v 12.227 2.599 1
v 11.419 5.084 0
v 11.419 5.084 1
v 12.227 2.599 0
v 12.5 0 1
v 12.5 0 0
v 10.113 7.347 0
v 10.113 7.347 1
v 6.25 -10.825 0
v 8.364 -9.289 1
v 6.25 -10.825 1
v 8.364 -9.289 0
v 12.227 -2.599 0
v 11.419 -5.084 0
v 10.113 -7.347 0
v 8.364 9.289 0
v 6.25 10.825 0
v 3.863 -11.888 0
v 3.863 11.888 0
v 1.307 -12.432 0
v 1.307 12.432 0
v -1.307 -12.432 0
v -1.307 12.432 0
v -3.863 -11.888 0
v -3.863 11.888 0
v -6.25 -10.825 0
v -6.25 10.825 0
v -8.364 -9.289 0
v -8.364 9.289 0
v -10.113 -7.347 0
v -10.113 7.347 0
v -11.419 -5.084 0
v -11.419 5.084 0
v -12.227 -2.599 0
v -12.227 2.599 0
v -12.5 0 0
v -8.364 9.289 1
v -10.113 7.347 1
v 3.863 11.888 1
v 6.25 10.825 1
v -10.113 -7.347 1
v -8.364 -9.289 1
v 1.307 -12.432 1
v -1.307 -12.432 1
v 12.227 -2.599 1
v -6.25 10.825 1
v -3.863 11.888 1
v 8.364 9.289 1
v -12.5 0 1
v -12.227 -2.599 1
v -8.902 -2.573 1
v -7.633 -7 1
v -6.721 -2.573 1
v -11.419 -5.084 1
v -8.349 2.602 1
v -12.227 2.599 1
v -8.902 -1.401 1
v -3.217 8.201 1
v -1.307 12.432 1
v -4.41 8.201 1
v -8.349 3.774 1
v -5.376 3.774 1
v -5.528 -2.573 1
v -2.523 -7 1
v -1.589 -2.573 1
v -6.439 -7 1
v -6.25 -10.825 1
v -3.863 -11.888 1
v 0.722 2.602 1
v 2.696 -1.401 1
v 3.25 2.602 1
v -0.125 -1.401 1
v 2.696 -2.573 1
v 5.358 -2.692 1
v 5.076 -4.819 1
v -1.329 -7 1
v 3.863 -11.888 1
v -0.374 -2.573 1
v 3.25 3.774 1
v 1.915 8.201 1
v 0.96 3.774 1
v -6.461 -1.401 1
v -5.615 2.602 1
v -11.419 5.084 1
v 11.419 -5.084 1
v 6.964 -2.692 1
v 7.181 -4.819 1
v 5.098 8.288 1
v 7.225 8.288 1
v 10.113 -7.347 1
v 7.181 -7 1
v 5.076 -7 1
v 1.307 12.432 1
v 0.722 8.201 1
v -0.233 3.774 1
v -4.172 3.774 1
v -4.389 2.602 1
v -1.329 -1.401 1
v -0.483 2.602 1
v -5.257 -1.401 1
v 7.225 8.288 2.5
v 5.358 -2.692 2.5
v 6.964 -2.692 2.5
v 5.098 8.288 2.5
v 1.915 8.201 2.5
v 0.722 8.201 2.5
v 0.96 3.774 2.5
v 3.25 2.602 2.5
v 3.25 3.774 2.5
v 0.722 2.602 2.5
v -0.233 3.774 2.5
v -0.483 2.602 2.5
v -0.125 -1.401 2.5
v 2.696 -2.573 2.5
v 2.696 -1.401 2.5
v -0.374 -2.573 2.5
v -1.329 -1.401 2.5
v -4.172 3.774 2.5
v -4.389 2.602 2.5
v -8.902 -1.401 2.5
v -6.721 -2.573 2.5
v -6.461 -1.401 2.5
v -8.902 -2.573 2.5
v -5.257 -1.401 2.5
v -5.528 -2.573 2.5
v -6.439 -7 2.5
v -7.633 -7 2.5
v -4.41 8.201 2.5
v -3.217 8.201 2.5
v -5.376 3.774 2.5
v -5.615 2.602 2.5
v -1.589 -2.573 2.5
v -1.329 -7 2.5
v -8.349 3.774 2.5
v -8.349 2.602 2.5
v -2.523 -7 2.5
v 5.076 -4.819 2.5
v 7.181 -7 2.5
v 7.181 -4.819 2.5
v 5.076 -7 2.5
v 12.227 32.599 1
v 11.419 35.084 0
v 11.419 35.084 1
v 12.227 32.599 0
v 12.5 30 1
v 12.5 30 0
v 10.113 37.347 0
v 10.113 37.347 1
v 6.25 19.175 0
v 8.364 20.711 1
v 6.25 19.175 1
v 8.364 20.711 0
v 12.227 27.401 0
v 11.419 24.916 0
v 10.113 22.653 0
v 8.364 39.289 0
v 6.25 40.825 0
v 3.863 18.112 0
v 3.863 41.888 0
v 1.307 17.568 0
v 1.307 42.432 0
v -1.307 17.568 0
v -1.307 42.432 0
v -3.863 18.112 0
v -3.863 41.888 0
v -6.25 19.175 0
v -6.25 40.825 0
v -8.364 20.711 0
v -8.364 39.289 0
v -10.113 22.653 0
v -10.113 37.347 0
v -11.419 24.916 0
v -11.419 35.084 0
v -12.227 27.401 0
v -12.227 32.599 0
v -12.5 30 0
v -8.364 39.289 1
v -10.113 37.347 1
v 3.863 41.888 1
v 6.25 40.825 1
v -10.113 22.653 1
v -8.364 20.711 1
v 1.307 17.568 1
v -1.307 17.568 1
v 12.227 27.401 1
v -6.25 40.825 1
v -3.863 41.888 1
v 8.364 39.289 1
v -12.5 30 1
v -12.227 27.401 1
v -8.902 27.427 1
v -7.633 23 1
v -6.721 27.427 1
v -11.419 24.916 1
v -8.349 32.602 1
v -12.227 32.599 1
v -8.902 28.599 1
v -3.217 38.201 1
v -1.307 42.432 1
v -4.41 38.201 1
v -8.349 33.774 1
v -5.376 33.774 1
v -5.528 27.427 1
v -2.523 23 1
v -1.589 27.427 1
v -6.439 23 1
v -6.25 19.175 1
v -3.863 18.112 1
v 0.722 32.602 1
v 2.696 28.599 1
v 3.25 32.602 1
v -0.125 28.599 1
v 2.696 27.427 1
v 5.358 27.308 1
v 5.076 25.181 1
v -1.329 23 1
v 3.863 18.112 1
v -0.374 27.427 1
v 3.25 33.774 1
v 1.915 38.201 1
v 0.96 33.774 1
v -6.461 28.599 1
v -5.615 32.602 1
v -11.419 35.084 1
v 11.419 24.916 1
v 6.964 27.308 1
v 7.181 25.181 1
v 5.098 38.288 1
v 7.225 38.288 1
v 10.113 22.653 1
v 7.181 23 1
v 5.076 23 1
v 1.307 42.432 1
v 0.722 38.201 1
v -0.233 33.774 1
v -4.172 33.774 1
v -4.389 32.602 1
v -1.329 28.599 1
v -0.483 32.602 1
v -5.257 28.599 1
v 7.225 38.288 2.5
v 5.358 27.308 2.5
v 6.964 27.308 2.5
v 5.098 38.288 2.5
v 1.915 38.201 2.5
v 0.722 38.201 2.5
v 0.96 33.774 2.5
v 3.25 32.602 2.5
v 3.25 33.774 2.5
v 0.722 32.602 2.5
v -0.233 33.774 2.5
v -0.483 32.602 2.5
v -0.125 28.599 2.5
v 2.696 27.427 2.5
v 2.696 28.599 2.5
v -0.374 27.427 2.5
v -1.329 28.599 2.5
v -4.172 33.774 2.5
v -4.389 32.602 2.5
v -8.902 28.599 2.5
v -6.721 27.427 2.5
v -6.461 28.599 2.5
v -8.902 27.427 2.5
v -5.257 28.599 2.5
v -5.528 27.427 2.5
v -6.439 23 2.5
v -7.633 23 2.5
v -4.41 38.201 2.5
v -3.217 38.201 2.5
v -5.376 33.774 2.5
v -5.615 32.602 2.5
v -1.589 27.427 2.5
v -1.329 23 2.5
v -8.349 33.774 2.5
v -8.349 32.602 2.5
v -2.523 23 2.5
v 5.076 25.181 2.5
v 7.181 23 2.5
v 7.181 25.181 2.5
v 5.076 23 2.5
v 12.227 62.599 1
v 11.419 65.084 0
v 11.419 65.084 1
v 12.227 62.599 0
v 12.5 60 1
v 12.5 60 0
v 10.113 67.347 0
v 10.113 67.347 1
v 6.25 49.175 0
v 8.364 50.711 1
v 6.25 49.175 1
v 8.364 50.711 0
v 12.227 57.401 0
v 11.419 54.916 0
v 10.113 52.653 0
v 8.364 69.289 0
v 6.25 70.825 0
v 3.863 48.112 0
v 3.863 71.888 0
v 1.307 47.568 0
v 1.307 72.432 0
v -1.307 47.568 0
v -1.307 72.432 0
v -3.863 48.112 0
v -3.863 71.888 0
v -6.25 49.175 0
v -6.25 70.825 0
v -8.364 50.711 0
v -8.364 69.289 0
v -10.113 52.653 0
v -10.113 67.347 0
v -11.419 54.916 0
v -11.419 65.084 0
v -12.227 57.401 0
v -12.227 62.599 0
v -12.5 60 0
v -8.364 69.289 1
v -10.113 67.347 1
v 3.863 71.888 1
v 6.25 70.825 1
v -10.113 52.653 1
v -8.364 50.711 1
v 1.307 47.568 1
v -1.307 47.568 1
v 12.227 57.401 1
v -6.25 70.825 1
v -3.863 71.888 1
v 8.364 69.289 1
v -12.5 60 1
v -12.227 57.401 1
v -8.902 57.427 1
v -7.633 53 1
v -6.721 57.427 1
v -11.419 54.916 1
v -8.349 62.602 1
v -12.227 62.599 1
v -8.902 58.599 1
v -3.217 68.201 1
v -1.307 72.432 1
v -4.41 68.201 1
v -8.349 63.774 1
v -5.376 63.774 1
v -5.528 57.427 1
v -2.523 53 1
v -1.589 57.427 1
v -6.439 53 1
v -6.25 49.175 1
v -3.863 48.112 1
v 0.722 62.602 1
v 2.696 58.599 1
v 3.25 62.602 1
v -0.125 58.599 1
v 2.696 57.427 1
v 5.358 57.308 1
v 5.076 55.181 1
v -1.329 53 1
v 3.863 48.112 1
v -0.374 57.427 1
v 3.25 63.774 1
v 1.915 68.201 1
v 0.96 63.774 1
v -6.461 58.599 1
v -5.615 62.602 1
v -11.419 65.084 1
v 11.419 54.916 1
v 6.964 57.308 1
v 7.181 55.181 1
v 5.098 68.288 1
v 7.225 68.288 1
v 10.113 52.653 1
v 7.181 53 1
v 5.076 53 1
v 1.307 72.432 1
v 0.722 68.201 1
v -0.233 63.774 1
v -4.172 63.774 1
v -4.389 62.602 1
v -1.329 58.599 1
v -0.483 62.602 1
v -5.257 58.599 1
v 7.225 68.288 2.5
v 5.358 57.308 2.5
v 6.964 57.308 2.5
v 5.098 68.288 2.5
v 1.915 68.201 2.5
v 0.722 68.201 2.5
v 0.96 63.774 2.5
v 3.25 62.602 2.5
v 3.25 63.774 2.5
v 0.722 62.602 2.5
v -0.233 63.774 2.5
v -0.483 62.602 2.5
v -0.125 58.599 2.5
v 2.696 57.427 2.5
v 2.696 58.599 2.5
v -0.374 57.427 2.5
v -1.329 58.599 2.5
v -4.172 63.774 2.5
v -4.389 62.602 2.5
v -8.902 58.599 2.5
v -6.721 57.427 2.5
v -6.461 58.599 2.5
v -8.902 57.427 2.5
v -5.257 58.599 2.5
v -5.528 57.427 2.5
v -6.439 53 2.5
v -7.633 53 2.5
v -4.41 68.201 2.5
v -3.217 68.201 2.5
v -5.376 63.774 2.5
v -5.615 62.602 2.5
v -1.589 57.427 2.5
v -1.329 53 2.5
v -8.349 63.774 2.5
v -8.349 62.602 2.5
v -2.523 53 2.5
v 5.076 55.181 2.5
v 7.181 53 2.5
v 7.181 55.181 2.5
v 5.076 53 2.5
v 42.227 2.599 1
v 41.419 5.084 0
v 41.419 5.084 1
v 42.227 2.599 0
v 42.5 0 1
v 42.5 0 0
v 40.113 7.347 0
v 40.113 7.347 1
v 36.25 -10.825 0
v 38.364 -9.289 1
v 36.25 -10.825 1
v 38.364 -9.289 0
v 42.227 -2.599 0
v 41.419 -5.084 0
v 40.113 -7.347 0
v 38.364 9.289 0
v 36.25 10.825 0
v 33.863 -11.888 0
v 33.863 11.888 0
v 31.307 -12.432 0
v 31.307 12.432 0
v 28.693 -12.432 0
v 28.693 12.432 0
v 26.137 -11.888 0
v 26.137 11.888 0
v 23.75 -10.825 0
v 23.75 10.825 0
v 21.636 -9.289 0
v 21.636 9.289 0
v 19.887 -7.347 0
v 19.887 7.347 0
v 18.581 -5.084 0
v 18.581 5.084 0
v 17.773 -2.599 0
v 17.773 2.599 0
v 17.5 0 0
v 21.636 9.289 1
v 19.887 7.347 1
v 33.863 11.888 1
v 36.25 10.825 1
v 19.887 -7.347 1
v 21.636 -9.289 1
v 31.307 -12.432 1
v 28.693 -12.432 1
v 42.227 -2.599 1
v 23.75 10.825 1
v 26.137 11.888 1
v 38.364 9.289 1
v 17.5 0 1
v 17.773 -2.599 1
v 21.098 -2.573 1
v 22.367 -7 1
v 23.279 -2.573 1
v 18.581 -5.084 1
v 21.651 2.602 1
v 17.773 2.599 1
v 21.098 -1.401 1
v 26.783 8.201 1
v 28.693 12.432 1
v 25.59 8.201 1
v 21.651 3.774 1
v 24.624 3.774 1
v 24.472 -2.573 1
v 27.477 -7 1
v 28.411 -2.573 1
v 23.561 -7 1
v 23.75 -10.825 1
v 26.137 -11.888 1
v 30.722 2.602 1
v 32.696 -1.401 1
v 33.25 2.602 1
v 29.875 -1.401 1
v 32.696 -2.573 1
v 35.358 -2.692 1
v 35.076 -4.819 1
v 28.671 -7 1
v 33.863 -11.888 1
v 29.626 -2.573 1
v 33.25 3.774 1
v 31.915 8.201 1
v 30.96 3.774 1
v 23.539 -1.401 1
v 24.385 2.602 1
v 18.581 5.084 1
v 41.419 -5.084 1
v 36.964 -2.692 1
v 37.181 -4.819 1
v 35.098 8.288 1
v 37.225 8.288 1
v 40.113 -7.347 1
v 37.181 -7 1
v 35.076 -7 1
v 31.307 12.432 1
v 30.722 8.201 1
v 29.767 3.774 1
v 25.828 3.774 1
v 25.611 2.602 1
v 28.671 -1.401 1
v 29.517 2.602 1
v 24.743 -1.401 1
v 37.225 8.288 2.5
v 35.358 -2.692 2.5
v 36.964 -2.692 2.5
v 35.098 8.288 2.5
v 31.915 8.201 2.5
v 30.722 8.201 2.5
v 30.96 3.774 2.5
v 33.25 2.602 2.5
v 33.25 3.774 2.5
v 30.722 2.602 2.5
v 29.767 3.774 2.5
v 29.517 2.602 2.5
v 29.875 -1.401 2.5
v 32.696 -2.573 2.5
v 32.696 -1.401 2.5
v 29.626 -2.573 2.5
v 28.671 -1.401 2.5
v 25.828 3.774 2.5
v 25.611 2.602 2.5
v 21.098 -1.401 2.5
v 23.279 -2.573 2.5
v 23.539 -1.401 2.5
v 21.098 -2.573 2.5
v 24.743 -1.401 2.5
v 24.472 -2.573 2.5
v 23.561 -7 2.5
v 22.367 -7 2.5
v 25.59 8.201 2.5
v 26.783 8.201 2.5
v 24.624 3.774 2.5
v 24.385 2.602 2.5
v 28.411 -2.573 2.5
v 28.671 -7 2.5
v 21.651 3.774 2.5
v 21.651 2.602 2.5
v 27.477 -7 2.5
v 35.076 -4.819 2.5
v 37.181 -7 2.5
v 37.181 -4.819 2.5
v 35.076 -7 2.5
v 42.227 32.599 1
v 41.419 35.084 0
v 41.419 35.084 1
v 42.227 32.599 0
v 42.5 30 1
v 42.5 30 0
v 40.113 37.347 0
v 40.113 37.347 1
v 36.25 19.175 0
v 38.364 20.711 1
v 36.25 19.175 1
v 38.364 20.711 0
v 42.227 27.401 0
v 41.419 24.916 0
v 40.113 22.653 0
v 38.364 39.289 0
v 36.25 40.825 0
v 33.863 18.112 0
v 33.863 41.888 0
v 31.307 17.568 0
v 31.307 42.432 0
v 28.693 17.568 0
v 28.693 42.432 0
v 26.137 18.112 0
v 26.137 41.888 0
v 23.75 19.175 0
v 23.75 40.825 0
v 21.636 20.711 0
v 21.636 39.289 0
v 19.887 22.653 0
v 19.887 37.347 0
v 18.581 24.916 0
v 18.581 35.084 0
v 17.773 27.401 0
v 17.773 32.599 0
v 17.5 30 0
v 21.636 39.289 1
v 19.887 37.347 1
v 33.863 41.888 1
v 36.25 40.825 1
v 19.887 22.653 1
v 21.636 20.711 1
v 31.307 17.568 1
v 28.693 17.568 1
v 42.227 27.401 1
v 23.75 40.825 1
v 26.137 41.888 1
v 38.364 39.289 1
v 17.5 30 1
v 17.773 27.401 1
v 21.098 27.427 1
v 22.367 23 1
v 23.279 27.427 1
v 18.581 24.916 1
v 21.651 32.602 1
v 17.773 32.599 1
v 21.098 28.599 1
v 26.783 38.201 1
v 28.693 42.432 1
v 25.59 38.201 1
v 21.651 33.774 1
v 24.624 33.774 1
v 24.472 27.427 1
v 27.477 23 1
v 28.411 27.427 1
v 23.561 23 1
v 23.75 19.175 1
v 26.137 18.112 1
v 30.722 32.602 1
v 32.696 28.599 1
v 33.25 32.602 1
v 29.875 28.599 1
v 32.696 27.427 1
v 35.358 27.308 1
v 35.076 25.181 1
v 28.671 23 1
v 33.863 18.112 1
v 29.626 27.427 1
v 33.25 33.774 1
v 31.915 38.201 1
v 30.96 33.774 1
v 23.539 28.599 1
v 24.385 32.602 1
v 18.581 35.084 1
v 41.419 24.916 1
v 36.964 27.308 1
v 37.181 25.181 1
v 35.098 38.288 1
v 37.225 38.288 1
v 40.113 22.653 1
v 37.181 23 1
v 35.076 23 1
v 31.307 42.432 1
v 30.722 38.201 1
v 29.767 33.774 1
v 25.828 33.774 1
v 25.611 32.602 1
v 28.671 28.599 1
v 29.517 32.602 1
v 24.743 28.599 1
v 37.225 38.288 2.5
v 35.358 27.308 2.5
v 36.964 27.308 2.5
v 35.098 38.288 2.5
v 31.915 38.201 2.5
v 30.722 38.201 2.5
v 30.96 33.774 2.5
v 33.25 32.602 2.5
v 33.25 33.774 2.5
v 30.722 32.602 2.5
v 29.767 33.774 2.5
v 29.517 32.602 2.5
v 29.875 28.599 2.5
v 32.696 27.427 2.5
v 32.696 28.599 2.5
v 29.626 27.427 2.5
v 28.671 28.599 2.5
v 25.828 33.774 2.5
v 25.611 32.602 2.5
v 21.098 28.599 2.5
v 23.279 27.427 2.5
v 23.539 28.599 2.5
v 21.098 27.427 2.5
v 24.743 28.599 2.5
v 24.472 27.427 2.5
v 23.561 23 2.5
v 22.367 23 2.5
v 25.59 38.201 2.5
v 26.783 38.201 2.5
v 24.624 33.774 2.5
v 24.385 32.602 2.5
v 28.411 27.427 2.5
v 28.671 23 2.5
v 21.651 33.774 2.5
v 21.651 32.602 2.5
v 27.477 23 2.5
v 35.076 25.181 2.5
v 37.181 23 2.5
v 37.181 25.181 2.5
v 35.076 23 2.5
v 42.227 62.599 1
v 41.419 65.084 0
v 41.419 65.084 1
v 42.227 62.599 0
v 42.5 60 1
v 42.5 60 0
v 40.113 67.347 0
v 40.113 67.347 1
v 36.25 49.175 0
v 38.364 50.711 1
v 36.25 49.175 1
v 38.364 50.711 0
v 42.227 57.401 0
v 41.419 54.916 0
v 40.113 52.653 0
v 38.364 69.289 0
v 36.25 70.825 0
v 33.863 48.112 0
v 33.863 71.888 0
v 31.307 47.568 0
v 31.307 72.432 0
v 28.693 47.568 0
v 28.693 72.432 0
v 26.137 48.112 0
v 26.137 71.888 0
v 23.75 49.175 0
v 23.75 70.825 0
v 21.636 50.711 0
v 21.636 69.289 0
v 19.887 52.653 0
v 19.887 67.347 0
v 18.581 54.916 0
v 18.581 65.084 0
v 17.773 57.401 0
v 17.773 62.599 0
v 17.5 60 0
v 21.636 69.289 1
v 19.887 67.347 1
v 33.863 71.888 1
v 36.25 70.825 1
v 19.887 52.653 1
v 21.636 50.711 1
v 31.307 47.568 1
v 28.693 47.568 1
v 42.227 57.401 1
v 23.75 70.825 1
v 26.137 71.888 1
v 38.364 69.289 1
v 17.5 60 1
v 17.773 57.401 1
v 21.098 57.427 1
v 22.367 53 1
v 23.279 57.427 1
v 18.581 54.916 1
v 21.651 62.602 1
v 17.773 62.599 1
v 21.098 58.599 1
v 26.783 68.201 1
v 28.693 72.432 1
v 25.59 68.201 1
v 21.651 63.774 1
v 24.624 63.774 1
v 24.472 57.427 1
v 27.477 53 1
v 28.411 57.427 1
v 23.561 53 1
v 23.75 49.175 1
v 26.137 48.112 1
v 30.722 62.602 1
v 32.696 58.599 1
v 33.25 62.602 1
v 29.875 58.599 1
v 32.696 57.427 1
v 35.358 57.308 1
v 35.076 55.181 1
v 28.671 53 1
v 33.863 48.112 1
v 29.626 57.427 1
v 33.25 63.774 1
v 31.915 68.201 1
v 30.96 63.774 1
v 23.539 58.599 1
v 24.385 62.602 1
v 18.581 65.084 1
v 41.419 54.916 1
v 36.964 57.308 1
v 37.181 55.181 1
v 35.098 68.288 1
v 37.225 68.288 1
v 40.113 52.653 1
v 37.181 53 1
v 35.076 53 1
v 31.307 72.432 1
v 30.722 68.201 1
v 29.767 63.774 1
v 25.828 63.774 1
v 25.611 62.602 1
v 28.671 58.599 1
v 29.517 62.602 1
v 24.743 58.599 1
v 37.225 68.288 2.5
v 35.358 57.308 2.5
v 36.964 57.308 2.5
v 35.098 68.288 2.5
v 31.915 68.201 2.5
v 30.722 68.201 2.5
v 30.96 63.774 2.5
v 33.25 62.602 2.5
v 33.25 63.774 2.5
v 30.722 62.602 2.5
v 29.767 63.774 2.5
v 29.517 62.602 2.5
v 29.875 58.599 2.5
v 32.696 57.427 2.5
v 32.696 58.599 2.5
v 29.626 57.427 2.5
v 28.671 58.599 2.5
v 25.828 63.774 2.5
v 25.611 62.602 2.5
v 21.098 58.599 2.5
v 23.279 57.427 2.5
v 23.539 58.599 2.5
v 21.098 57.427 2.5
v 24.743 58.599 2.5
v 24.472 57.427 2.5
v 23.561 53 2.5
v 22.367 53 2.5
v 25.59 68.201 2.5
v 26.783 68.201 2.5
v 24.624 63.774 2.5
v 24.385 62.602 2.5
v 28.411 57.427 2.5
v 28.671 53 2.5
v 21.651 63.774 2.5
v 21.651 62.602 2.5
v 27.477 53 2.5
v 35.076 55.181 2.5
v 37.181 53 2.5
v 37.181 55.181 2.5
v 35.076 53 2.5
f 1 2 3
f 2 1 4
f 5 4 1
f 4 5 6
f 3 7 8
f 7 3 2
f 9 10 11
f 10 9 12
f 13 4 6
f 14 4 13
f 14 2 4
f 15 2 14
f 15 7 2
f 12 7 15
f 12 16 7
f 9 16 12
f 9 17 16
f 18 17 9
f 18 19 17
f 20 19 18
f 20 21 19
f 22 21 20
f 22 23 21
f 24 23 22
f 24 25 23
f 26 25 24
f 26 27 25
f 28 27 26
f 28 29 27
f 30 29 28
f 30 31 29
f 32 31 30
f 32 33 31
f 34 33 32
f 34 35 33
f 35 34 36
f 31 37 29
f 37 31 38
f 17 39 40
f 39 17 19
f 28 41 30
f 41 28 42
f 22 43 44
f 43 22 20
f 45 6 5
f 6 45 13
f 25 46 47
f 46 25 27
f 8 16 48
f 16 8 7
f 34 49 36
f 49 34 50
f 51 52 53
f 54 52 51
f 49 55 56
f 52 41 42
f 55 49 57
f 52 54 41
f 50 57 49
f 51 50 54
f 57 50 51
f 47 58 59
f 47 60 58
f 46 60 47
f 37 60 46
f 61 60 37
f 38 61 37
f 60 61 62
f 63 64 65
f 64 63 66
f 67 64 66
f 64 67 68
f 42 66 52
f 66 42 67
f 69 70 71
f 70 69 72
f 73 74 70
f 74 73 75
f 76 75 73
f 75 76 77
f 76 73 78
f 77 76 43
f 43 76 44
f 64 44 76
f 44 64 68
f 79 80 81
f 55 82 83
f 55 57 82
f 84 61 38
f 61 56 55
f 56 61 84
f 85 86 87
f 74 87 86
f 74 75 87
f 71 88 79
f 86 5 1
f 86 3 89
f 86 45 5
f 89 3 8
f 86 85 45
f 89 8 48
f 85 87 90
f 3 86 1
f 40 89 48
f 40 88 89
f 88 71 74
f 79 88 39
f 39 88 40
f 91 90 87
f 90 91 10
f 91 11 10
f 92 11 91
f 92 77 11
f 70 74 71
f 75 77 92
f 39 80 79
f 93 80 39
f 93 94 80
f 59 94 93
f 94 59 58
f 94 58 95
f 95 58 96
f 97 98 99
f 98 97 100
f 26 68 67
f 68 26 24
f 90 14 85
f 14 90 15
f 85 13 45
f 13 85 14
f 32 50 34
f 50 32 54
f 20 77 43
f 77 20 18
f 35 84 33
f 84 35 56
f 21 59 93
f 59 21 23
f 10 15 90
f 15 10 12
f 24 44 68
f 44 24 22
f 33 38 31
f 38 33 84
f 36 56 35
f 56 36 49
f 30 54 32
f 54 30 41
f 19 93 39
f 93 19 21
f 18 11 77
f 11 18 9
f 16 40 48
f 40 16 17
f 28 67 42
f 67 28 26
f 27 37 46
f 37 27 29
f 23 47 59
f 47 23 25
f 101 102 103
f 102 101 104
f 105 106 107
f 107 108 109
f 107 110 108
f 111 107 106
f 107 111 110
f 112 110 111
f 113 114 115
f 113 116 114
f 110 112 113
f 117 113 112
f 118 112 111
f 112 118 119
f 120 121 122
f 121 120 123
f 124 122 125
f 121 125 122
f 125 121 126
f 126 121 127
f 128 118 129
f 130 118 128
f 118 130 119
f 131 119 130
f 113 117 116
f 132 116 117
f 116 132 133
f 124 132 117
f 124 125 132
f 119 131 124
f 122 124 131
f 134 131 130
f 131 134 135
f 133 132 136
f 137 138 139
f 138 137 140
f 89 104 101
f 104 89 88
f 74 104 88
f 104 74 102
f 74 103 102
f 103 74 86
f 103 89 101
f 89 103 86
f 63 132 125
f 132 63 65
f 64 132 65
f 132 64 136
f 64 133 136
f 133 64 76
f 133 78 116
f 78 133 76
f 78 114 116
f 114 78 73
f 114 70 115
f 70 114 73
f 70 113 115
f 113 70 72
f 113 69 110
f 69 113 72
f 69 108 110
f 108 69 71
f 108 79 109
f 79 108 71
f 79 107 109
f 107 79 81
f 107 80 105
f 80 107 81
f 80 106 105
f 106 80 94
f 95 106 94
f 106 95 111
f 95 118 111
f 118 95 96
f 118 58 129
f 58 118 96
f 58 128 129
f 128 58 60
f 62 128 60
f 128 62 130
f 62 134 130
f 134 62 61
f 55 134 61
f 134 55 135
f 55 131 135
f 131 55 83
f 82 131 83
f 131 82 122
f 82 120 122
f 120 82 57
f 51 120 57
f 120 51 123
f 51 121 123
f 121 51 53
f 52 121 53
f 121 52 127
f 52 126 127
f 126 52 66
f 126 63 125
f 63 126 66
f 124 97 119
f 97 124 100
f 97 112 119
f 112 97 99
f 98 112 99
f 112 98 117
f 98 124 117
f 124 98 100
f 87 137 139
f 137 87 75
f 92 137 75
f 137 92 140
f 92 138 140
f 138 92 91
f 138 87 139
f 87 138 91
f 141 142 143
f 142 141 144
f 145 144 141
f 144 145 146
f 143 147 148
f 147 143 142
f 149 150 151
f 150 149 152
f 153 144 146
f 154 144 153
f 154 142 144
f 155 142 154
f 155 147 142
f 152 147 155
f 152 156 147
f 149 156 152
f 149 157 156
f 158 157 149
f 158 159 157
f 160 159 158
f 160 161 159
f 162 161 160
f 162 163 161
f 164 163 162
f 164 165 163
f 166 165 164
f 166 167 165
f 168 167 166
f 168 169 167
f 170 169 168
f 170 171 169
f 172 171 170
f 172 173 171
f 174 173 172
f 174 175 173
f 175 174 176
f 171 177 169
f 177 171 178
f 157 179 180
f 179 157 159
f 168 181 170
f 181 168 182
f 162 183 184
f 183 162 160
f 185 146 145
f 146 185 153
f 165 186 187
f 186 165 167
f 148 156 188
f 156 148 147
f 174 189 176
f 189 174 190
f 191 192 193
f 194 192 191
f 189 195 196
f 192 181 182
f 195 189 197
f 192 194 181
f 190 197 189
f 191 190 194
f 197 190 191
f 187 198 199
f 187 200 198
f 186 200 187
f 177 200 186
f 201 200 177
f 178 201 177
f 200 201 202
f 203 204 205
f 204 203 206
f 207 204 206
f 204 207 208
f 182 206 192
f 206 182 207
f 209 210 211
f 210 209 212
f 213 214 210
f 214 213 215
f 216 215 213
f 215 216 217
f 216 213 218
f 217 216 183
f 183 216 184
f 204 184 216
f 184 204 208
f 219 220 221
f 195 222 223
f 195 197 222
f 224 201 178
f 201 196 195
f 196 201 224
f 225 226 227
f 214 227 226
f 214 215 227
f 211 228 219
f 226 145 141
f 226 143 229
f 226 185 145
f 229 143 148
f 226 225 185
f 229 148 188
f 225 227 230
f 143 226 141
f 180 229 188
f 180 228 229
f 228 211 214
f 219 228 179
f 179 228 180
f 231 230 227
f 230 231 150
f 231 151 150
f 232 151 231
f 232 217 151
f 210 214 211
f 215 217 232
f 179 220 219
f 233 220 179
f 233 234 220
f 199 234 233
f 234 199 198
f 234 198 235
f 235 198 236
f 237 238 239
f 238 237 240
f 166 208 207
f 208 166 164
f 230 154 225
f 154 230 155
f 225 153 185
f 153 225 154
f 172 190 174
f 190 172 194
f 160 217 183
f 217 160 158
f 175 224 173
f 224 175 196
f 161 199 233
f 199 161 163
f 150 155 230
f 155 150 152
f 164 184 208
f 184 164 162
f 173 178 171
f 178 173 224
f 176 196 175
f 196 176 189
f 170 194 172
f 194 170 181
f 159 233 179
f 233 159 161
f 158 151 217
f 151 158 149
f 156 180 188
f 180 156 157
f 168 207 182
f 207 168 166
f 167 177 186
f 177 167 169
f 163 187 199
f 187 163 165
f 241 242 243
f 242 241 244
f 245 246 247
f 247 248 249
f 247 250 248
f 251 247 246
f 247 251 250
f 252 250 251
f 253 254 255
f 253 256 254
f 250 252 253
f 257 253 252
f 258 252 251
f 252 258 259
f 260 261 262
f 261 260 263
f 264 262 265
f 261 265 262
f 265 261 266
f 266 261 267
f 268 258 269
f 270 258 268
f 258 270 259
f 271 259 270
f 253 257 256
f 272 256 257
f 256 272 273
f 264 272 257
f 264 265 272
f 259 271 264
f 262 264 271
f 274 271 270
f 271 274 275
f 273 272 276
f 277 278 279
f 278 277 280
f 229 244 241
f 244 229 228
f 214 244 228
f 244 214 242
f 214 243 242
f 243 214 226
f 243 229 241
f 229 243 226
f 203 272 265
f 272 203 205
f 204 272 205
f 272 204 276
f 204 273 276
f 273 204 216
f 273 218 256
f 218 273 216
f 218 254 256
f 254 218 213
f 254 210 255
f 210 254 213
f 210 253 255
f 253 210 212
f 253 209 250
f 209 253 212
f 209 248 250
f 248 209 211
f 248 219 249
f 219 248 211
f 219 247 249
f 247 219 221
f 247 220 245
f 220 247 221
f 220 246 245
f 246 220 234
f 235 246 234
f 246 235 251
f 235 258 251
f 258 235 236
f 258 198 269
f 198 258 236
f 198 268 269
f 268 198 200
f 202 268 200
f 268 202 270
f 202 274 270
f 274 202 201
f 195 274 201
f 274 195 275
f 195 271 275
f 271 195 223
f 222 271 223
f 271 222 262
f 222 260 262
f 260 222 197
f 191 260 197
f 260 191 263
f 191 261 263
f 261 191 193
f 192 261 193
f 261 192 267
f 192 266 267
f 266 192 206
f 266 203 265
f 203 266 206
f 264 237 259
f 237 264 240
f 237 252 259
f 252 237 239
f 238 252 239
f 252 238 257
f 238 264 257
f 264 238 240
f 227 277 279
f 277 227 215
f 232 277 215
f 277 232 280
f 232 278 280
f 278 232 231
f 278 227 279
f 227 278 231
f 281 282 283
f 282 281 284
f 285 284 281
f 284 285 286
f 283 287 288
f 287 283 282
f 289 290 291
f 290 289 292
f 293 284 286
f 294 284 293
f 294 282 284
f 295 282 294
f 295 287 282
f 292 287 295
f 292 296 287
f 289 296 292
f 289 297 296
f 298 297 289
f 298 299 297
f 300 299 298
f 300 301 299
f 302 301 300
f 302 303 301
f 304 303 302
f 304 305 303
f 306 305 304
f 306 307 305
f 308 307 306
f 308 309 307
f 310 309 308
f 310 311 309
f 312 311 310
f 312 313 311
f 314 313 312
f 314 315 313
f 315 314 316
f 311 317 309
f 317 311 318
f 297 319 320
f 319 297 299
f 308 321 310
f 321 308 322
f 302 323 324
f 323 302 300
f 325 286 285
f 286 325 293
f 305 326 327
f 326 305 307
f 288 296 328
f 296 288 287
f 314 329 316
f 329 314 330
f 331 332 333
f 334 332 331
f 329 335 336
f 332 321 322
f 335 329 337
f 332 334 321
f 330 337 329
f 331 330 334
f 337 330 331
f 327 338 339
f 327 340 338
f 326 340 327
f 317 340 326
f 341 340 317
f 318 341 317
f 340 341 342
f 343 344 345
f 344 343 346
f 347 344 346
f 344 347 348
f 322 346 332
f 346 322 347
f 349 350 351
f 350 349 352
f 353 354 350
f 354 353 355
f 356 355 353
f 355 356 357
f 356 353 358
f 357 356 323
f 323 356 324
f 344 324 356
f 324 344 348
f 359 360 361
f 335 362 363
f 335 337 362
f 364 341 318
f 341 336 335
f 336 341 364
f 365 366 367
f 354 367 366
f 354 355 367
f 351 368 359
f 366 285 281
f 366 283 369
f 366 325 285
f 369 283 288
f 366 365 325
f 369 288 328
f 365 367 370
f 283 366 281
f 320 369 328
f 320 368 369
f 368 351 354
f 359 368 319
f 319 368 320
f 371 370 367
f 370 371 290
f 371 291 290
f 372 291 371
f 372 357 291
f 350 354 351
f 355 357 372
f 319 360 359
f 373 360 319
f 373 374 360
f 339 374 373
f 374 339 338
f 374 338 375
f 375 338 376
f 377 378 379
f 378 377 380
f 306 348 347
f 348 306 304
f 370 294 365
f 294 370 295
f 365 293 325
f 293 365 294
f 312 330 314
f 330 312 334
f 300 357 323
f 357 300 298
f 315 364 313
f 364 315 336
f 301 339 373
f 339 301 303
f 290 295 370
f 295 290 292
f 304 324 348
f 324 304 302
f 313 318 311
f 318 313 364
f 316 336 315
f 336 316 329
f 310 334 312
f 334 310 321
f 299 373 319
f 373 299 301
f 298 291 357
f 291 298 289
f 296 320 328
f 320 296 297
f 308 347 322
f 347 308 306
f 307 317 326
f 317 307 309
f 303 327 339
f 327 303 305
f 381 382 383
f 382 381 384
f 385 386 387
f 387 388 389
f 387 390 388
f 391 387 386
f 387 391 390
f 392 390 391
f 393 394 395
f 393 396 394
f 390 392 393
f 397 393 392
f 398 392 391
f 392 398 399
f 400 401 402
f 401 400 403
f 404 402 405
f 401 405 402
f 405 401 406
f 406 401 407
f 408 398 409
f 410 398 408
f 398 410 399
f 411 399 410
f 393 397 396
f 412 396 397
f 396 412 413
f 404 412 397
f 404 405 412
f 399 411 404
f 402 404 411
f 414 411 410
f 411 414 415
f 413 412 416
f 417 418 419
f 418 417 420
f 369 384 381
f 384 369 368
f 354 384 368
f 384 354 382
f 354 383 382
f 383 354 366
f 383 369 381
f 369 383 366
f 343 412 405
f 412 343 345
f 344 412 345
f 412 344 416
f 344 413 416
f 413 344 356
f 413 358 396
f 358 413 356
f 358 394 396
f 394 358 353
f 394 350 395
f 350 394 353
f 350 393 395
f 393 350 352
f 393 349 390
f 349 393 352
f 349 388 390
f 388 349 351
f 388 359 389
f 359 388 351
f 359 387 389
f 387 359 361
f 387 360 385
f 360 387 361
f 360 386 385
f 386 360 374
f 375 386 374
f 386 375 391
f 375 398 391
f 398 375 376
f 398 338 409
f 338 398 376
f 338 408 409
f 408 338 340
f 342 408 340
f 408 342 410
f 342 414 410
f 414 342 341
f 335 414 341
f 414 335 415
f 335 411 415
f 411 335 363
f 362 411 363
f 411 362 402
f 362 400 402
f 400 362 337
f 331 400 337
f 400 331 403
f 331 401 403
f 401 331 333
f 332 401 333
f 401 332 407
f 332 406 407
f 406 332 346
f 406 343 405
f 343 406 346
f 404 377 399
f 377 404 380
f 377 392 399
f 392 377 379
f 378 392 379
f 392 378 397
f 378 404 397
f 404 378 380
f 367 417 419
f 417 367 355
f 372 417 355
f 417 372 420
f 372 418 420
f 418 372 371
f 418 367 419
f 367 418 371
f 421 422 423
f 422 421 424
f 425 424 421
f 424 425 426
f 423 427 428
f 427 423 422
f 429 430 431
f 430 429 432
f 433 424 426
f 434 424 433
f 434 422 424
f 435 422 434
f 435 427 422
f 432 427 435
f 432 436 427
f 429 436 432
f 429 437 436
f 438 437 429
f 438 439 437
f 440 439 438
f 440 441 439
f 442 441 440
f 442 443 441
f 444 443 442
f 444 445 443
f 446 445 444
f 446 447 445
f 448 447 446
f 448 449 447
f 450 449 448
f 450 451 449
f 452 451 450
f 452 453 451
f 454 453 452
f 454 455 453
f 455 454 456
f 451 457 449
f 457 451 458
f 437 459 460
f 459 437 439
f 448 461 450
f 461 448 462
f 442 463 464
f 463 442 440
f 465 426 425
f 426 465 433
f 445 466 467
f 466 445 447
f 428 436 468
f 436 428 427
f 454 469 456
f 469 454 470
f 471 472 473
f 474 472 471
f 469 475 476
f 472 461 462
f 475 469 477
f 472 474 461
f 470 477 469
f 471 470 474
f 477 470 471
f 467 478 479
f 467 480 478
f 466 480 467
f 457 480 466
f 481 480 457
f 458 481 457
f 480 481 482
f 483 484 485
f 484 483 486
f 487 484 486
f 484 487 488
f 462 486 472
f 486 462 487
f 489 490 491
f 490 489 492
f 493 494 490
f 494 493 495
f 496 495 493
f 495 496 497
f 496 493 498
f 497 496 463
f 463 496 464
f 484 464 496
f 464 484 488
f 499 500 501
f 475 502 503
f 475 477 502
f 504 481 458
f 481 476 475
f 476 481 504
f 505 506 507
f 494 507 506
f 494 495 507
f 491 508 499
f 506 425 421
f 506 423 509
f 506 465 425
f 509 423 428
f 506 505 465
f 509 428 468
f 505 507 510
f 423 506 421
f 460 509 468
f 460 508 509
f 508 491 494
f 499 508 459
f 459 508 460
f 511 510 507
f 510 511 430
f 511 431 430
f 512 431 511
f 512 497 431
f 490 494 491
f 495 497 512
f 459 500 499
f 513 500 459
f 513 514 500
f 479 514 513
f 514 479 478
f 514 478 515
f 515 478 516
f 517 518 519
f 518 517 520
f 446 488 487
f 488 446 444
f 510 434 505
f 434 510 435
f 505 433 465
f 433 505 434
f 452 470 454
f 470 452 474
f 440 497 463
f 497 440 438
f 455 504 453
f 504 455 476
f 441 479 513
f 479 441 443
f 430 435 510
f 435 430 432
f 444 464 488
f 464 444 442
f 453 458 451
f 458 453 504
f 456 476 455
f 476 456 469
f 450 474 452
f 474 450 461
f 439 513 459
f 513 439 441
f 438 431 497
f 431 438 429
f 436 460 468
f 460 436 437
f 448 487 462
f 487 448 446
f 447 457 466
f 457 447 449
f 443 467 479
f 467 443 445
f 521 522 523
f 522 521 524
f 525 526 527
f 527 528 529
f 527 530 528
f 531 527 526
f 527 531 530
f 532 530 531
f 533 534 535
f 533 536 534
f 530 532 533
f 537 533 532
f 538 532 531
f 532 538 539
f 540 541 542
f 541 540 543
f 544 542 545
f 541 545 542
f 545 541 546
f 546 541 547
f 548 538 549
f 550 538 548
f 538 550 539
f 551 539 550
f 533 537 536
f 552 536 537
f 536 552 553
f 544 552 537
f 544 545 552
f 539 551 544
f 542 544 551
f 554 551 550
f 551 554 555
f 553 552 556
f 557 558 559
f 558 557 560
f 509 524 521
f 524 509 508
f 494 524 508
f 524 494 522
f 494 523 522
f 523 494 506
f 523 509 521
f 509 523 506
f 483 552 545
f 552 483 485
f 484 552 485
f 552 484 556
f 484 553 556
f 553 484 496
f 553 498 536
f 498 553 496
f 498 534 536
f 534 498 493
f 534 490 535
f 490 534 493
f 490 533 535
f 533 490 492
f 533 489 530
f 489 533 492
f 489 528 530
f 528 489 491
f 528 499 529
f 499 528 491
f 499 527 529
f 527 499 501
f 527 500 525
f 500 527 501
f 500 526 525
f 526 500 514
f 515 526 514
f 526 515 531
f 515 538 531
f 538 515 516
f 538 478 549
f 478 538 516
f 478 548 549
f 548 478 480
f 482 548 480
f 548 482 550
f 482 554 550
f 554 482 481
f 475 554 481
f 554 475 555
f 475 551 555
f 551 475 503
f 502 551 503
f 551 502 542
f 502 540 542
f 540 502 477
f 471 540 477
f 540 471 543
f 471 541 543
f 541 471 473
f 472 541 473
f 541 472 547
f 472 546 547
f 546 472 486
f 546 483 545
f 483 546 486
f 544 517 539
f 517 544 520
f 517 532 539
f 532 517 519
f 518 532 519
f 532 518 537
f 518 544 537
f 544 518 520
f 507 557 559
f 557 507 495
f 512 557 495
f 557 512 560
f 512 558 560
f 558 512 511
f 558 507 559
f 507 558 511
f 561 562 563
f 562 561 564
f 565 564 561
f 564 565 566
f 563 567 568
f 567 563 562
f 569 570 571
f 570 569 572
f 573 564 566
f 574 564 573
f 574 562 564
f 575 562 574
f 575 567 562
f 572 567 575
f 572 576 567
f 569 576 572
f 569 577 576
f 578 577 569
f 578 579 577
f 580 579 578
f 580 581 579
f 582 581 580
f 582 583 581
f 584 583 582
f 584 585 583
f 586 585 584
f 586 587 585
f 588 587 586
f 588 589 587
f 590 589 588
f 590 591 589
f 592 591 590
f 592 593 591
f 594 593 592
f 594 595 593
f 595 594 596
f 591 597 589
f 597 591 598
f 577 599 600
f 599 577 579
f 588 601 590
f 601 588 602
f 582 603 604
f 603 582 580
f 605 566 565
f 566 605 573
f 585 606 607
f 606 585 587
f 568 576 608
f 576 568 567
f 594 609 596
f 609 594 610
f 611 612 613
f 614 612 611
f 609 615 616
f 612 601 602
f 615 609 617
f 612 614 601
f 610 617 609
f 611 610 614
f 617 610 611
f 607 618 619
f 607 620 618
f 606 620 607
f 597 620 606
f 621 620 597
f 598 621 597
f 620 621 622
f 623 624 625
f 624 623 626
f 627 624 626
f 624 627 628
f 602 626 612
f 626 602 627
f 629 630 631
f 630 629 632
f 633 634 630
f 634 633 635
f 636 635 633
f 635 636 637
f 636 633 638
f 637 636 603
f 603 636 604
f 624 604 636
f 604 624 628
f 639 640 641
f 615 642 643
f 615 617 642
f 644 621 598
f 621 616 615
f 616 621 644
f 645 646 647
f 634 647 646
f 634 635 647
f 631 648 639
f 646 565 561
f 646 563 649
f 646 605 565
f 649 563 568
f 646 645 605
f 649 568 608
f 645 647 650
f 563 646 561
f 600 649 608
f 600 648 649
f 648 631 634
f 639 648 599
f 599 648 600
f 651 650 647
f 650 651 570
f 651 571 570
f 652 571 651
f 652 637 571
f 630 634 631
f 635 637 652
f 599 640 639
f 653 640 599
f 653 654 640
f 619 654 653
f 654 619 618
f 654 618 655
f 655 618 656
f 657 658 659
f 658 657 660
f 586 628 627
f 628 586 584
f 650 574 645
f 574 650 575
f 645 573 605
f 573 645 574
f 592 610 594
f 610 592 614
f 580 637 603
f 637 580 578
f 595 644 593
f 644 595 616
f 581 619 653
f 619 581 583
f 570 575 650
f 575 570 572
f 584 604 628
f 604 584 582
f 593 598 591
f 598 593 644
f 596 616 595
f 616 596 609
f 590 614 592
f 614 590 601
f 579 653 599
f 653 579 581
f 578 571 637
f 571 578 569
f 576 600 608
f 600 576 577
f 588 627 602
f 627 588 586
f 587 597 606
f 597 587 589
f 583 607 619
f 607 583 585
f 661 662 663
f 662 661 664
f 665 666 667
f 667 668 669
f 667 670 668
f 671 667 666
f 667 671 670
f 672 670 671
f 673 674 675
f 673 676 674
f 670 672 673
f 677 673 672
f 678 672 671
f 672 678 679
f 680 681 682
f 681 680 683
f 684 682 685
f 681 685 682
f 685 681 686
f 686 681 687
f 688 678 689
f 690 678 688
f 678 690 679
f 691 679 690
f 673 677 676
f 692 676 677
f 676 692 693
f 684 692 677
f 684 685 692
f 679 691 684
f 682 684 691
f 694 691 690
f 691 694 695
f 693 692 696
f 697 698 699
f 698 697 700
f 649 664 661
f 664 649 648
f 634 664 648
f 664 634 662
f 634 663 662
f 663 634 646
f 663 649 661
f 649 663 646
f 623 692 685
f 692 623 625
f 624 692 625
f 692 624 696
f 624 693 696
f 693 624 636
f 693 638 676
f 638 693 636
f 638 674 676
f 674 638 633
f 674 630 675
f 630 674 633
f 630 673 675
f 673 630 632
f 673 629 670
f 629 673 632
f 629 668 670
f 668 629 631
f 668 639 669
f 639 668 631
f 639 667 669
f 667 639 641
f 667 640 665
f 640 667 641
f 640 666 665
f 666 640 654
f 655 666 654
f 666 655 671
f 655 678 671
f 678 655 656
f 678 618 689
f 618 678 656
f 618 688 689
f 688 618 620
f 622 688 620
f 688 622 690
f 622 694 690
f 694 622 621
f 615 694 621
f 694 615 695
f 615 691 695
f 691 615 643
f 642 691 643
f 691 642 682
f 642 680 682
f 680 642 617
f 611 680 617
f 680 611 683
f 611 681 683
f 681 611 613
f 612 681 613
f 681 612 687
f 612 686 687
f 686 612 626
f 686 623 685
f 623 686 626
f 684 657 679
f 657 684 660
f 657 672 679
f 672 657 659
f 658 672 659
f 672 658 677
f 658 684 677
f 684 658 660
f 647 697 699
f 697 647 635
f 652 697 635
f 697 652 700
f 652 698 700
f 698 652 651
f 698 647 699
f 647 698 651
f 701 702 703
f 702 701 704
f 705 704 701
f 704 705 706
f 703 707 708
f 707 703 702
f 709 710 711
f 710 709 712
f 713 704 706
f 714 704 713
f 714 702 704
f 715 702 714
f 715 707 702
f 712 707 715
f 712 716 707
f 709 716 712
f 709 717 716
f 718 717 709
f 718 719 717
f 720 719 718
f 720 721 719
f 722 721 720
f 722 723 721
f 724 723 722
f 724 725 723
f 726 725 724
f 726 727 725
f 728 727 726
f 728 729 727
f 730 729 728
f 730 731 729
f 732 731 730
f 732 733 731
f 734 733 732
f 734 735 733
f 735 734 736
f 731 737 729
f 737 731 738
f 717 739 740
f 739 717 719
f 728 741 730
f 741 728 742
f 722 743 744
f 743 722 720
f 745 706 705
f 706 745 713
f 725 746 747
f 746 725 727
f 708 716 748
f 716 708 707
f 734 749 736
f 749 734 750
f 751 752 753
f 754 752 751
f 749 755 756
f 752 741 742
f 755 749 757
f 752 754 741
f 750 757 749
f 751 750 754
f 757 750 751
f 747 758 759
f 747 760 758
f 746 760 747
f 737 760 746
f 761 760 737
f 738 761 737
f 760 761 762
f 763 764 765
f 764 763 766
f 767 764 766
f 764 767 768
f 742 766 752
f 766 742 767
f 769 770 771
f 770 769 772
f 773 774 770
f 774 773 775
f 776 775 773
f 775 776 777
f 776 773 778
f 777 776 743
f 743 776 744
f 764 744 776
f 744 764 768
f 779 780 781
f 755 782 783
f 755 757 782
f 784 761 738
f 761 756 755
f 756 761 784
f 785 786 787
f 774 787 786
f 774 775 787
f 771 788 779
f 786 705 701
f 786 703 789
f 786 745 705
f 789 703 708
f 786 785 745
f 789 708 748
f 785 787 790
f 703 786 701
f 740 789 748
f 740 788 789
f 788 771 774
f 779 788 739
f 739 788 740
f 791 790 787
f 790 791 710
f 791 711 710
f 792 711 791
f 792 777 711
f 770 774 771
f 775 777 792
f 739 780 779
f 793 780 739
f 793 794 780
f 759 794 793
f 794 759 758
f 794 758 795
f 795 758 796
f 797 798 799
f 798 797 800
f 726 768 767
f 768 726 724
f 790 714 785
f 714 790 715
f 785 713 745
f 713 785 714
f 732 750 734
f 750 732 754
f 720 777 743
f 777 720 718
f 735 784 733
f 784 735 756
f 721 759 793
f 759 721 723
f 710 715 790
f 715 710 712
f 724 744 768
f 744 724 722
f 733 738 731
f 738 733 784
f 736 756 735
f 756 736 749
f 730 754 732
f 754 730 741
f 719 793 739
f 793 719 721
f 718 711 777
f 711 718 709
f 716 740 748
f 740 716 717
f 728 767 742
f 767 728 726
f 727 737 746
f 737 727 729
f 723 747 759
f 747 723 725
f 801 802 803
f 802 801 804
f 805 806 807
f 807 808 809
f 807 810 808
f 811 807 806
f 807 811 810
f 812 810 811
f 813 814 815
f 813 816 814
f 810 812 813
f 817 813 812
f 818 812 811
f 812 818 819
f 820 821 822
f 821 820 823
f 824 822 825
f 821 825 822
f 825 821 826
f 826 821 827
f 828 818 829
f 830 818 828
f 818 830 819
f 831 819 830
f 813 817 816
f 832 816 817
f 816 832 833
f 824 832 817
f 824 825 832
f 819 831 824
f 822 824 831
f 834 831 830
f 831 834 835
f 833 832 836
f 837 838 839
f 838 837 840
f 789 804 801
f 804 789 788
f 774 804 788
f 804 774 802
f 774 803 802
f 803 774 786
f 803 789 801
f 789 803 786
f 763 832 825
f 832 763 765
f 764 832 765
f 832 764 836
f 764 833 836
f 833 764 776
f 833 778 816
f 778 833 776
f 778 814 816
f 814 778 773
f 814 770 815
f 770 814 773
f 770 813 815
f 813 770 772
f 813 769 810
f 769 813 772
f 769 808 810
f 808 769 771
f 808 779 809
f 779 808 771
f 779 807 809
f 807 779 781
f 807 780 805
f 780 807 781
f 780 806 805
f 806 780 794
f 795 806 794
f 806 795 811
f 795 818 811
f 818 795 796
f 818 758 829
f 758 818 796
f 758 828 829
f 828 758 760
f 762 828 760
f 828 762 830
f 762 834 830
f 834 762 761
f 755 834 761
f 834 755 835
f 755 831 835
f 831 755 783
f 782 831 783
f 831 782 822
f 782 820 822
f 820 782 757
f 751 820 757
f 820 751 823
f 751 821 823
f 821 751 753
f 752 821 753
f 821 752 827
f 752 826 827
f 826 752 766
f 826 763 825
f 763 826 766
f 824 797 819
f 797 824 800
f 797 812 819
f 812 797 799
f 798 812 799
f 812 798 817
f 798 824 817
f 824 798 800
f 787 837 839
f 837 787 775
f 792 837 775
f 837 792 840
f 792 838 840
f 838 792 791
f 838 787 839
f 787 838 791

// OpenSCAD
N=2;
M=3;

module coin()
{
  cylinder(r=25/2, h=1, $fs=0.1);

  translate([-9, -7, 1])
    linear_extrude(height=1.5)
      text(text=str("#!"), size=16, halign=[0,"left"]);
}



for(i = [0:N-1])
  for(j = [0:M-1])
    translate([i*30, j*30, 0])
      coin();
